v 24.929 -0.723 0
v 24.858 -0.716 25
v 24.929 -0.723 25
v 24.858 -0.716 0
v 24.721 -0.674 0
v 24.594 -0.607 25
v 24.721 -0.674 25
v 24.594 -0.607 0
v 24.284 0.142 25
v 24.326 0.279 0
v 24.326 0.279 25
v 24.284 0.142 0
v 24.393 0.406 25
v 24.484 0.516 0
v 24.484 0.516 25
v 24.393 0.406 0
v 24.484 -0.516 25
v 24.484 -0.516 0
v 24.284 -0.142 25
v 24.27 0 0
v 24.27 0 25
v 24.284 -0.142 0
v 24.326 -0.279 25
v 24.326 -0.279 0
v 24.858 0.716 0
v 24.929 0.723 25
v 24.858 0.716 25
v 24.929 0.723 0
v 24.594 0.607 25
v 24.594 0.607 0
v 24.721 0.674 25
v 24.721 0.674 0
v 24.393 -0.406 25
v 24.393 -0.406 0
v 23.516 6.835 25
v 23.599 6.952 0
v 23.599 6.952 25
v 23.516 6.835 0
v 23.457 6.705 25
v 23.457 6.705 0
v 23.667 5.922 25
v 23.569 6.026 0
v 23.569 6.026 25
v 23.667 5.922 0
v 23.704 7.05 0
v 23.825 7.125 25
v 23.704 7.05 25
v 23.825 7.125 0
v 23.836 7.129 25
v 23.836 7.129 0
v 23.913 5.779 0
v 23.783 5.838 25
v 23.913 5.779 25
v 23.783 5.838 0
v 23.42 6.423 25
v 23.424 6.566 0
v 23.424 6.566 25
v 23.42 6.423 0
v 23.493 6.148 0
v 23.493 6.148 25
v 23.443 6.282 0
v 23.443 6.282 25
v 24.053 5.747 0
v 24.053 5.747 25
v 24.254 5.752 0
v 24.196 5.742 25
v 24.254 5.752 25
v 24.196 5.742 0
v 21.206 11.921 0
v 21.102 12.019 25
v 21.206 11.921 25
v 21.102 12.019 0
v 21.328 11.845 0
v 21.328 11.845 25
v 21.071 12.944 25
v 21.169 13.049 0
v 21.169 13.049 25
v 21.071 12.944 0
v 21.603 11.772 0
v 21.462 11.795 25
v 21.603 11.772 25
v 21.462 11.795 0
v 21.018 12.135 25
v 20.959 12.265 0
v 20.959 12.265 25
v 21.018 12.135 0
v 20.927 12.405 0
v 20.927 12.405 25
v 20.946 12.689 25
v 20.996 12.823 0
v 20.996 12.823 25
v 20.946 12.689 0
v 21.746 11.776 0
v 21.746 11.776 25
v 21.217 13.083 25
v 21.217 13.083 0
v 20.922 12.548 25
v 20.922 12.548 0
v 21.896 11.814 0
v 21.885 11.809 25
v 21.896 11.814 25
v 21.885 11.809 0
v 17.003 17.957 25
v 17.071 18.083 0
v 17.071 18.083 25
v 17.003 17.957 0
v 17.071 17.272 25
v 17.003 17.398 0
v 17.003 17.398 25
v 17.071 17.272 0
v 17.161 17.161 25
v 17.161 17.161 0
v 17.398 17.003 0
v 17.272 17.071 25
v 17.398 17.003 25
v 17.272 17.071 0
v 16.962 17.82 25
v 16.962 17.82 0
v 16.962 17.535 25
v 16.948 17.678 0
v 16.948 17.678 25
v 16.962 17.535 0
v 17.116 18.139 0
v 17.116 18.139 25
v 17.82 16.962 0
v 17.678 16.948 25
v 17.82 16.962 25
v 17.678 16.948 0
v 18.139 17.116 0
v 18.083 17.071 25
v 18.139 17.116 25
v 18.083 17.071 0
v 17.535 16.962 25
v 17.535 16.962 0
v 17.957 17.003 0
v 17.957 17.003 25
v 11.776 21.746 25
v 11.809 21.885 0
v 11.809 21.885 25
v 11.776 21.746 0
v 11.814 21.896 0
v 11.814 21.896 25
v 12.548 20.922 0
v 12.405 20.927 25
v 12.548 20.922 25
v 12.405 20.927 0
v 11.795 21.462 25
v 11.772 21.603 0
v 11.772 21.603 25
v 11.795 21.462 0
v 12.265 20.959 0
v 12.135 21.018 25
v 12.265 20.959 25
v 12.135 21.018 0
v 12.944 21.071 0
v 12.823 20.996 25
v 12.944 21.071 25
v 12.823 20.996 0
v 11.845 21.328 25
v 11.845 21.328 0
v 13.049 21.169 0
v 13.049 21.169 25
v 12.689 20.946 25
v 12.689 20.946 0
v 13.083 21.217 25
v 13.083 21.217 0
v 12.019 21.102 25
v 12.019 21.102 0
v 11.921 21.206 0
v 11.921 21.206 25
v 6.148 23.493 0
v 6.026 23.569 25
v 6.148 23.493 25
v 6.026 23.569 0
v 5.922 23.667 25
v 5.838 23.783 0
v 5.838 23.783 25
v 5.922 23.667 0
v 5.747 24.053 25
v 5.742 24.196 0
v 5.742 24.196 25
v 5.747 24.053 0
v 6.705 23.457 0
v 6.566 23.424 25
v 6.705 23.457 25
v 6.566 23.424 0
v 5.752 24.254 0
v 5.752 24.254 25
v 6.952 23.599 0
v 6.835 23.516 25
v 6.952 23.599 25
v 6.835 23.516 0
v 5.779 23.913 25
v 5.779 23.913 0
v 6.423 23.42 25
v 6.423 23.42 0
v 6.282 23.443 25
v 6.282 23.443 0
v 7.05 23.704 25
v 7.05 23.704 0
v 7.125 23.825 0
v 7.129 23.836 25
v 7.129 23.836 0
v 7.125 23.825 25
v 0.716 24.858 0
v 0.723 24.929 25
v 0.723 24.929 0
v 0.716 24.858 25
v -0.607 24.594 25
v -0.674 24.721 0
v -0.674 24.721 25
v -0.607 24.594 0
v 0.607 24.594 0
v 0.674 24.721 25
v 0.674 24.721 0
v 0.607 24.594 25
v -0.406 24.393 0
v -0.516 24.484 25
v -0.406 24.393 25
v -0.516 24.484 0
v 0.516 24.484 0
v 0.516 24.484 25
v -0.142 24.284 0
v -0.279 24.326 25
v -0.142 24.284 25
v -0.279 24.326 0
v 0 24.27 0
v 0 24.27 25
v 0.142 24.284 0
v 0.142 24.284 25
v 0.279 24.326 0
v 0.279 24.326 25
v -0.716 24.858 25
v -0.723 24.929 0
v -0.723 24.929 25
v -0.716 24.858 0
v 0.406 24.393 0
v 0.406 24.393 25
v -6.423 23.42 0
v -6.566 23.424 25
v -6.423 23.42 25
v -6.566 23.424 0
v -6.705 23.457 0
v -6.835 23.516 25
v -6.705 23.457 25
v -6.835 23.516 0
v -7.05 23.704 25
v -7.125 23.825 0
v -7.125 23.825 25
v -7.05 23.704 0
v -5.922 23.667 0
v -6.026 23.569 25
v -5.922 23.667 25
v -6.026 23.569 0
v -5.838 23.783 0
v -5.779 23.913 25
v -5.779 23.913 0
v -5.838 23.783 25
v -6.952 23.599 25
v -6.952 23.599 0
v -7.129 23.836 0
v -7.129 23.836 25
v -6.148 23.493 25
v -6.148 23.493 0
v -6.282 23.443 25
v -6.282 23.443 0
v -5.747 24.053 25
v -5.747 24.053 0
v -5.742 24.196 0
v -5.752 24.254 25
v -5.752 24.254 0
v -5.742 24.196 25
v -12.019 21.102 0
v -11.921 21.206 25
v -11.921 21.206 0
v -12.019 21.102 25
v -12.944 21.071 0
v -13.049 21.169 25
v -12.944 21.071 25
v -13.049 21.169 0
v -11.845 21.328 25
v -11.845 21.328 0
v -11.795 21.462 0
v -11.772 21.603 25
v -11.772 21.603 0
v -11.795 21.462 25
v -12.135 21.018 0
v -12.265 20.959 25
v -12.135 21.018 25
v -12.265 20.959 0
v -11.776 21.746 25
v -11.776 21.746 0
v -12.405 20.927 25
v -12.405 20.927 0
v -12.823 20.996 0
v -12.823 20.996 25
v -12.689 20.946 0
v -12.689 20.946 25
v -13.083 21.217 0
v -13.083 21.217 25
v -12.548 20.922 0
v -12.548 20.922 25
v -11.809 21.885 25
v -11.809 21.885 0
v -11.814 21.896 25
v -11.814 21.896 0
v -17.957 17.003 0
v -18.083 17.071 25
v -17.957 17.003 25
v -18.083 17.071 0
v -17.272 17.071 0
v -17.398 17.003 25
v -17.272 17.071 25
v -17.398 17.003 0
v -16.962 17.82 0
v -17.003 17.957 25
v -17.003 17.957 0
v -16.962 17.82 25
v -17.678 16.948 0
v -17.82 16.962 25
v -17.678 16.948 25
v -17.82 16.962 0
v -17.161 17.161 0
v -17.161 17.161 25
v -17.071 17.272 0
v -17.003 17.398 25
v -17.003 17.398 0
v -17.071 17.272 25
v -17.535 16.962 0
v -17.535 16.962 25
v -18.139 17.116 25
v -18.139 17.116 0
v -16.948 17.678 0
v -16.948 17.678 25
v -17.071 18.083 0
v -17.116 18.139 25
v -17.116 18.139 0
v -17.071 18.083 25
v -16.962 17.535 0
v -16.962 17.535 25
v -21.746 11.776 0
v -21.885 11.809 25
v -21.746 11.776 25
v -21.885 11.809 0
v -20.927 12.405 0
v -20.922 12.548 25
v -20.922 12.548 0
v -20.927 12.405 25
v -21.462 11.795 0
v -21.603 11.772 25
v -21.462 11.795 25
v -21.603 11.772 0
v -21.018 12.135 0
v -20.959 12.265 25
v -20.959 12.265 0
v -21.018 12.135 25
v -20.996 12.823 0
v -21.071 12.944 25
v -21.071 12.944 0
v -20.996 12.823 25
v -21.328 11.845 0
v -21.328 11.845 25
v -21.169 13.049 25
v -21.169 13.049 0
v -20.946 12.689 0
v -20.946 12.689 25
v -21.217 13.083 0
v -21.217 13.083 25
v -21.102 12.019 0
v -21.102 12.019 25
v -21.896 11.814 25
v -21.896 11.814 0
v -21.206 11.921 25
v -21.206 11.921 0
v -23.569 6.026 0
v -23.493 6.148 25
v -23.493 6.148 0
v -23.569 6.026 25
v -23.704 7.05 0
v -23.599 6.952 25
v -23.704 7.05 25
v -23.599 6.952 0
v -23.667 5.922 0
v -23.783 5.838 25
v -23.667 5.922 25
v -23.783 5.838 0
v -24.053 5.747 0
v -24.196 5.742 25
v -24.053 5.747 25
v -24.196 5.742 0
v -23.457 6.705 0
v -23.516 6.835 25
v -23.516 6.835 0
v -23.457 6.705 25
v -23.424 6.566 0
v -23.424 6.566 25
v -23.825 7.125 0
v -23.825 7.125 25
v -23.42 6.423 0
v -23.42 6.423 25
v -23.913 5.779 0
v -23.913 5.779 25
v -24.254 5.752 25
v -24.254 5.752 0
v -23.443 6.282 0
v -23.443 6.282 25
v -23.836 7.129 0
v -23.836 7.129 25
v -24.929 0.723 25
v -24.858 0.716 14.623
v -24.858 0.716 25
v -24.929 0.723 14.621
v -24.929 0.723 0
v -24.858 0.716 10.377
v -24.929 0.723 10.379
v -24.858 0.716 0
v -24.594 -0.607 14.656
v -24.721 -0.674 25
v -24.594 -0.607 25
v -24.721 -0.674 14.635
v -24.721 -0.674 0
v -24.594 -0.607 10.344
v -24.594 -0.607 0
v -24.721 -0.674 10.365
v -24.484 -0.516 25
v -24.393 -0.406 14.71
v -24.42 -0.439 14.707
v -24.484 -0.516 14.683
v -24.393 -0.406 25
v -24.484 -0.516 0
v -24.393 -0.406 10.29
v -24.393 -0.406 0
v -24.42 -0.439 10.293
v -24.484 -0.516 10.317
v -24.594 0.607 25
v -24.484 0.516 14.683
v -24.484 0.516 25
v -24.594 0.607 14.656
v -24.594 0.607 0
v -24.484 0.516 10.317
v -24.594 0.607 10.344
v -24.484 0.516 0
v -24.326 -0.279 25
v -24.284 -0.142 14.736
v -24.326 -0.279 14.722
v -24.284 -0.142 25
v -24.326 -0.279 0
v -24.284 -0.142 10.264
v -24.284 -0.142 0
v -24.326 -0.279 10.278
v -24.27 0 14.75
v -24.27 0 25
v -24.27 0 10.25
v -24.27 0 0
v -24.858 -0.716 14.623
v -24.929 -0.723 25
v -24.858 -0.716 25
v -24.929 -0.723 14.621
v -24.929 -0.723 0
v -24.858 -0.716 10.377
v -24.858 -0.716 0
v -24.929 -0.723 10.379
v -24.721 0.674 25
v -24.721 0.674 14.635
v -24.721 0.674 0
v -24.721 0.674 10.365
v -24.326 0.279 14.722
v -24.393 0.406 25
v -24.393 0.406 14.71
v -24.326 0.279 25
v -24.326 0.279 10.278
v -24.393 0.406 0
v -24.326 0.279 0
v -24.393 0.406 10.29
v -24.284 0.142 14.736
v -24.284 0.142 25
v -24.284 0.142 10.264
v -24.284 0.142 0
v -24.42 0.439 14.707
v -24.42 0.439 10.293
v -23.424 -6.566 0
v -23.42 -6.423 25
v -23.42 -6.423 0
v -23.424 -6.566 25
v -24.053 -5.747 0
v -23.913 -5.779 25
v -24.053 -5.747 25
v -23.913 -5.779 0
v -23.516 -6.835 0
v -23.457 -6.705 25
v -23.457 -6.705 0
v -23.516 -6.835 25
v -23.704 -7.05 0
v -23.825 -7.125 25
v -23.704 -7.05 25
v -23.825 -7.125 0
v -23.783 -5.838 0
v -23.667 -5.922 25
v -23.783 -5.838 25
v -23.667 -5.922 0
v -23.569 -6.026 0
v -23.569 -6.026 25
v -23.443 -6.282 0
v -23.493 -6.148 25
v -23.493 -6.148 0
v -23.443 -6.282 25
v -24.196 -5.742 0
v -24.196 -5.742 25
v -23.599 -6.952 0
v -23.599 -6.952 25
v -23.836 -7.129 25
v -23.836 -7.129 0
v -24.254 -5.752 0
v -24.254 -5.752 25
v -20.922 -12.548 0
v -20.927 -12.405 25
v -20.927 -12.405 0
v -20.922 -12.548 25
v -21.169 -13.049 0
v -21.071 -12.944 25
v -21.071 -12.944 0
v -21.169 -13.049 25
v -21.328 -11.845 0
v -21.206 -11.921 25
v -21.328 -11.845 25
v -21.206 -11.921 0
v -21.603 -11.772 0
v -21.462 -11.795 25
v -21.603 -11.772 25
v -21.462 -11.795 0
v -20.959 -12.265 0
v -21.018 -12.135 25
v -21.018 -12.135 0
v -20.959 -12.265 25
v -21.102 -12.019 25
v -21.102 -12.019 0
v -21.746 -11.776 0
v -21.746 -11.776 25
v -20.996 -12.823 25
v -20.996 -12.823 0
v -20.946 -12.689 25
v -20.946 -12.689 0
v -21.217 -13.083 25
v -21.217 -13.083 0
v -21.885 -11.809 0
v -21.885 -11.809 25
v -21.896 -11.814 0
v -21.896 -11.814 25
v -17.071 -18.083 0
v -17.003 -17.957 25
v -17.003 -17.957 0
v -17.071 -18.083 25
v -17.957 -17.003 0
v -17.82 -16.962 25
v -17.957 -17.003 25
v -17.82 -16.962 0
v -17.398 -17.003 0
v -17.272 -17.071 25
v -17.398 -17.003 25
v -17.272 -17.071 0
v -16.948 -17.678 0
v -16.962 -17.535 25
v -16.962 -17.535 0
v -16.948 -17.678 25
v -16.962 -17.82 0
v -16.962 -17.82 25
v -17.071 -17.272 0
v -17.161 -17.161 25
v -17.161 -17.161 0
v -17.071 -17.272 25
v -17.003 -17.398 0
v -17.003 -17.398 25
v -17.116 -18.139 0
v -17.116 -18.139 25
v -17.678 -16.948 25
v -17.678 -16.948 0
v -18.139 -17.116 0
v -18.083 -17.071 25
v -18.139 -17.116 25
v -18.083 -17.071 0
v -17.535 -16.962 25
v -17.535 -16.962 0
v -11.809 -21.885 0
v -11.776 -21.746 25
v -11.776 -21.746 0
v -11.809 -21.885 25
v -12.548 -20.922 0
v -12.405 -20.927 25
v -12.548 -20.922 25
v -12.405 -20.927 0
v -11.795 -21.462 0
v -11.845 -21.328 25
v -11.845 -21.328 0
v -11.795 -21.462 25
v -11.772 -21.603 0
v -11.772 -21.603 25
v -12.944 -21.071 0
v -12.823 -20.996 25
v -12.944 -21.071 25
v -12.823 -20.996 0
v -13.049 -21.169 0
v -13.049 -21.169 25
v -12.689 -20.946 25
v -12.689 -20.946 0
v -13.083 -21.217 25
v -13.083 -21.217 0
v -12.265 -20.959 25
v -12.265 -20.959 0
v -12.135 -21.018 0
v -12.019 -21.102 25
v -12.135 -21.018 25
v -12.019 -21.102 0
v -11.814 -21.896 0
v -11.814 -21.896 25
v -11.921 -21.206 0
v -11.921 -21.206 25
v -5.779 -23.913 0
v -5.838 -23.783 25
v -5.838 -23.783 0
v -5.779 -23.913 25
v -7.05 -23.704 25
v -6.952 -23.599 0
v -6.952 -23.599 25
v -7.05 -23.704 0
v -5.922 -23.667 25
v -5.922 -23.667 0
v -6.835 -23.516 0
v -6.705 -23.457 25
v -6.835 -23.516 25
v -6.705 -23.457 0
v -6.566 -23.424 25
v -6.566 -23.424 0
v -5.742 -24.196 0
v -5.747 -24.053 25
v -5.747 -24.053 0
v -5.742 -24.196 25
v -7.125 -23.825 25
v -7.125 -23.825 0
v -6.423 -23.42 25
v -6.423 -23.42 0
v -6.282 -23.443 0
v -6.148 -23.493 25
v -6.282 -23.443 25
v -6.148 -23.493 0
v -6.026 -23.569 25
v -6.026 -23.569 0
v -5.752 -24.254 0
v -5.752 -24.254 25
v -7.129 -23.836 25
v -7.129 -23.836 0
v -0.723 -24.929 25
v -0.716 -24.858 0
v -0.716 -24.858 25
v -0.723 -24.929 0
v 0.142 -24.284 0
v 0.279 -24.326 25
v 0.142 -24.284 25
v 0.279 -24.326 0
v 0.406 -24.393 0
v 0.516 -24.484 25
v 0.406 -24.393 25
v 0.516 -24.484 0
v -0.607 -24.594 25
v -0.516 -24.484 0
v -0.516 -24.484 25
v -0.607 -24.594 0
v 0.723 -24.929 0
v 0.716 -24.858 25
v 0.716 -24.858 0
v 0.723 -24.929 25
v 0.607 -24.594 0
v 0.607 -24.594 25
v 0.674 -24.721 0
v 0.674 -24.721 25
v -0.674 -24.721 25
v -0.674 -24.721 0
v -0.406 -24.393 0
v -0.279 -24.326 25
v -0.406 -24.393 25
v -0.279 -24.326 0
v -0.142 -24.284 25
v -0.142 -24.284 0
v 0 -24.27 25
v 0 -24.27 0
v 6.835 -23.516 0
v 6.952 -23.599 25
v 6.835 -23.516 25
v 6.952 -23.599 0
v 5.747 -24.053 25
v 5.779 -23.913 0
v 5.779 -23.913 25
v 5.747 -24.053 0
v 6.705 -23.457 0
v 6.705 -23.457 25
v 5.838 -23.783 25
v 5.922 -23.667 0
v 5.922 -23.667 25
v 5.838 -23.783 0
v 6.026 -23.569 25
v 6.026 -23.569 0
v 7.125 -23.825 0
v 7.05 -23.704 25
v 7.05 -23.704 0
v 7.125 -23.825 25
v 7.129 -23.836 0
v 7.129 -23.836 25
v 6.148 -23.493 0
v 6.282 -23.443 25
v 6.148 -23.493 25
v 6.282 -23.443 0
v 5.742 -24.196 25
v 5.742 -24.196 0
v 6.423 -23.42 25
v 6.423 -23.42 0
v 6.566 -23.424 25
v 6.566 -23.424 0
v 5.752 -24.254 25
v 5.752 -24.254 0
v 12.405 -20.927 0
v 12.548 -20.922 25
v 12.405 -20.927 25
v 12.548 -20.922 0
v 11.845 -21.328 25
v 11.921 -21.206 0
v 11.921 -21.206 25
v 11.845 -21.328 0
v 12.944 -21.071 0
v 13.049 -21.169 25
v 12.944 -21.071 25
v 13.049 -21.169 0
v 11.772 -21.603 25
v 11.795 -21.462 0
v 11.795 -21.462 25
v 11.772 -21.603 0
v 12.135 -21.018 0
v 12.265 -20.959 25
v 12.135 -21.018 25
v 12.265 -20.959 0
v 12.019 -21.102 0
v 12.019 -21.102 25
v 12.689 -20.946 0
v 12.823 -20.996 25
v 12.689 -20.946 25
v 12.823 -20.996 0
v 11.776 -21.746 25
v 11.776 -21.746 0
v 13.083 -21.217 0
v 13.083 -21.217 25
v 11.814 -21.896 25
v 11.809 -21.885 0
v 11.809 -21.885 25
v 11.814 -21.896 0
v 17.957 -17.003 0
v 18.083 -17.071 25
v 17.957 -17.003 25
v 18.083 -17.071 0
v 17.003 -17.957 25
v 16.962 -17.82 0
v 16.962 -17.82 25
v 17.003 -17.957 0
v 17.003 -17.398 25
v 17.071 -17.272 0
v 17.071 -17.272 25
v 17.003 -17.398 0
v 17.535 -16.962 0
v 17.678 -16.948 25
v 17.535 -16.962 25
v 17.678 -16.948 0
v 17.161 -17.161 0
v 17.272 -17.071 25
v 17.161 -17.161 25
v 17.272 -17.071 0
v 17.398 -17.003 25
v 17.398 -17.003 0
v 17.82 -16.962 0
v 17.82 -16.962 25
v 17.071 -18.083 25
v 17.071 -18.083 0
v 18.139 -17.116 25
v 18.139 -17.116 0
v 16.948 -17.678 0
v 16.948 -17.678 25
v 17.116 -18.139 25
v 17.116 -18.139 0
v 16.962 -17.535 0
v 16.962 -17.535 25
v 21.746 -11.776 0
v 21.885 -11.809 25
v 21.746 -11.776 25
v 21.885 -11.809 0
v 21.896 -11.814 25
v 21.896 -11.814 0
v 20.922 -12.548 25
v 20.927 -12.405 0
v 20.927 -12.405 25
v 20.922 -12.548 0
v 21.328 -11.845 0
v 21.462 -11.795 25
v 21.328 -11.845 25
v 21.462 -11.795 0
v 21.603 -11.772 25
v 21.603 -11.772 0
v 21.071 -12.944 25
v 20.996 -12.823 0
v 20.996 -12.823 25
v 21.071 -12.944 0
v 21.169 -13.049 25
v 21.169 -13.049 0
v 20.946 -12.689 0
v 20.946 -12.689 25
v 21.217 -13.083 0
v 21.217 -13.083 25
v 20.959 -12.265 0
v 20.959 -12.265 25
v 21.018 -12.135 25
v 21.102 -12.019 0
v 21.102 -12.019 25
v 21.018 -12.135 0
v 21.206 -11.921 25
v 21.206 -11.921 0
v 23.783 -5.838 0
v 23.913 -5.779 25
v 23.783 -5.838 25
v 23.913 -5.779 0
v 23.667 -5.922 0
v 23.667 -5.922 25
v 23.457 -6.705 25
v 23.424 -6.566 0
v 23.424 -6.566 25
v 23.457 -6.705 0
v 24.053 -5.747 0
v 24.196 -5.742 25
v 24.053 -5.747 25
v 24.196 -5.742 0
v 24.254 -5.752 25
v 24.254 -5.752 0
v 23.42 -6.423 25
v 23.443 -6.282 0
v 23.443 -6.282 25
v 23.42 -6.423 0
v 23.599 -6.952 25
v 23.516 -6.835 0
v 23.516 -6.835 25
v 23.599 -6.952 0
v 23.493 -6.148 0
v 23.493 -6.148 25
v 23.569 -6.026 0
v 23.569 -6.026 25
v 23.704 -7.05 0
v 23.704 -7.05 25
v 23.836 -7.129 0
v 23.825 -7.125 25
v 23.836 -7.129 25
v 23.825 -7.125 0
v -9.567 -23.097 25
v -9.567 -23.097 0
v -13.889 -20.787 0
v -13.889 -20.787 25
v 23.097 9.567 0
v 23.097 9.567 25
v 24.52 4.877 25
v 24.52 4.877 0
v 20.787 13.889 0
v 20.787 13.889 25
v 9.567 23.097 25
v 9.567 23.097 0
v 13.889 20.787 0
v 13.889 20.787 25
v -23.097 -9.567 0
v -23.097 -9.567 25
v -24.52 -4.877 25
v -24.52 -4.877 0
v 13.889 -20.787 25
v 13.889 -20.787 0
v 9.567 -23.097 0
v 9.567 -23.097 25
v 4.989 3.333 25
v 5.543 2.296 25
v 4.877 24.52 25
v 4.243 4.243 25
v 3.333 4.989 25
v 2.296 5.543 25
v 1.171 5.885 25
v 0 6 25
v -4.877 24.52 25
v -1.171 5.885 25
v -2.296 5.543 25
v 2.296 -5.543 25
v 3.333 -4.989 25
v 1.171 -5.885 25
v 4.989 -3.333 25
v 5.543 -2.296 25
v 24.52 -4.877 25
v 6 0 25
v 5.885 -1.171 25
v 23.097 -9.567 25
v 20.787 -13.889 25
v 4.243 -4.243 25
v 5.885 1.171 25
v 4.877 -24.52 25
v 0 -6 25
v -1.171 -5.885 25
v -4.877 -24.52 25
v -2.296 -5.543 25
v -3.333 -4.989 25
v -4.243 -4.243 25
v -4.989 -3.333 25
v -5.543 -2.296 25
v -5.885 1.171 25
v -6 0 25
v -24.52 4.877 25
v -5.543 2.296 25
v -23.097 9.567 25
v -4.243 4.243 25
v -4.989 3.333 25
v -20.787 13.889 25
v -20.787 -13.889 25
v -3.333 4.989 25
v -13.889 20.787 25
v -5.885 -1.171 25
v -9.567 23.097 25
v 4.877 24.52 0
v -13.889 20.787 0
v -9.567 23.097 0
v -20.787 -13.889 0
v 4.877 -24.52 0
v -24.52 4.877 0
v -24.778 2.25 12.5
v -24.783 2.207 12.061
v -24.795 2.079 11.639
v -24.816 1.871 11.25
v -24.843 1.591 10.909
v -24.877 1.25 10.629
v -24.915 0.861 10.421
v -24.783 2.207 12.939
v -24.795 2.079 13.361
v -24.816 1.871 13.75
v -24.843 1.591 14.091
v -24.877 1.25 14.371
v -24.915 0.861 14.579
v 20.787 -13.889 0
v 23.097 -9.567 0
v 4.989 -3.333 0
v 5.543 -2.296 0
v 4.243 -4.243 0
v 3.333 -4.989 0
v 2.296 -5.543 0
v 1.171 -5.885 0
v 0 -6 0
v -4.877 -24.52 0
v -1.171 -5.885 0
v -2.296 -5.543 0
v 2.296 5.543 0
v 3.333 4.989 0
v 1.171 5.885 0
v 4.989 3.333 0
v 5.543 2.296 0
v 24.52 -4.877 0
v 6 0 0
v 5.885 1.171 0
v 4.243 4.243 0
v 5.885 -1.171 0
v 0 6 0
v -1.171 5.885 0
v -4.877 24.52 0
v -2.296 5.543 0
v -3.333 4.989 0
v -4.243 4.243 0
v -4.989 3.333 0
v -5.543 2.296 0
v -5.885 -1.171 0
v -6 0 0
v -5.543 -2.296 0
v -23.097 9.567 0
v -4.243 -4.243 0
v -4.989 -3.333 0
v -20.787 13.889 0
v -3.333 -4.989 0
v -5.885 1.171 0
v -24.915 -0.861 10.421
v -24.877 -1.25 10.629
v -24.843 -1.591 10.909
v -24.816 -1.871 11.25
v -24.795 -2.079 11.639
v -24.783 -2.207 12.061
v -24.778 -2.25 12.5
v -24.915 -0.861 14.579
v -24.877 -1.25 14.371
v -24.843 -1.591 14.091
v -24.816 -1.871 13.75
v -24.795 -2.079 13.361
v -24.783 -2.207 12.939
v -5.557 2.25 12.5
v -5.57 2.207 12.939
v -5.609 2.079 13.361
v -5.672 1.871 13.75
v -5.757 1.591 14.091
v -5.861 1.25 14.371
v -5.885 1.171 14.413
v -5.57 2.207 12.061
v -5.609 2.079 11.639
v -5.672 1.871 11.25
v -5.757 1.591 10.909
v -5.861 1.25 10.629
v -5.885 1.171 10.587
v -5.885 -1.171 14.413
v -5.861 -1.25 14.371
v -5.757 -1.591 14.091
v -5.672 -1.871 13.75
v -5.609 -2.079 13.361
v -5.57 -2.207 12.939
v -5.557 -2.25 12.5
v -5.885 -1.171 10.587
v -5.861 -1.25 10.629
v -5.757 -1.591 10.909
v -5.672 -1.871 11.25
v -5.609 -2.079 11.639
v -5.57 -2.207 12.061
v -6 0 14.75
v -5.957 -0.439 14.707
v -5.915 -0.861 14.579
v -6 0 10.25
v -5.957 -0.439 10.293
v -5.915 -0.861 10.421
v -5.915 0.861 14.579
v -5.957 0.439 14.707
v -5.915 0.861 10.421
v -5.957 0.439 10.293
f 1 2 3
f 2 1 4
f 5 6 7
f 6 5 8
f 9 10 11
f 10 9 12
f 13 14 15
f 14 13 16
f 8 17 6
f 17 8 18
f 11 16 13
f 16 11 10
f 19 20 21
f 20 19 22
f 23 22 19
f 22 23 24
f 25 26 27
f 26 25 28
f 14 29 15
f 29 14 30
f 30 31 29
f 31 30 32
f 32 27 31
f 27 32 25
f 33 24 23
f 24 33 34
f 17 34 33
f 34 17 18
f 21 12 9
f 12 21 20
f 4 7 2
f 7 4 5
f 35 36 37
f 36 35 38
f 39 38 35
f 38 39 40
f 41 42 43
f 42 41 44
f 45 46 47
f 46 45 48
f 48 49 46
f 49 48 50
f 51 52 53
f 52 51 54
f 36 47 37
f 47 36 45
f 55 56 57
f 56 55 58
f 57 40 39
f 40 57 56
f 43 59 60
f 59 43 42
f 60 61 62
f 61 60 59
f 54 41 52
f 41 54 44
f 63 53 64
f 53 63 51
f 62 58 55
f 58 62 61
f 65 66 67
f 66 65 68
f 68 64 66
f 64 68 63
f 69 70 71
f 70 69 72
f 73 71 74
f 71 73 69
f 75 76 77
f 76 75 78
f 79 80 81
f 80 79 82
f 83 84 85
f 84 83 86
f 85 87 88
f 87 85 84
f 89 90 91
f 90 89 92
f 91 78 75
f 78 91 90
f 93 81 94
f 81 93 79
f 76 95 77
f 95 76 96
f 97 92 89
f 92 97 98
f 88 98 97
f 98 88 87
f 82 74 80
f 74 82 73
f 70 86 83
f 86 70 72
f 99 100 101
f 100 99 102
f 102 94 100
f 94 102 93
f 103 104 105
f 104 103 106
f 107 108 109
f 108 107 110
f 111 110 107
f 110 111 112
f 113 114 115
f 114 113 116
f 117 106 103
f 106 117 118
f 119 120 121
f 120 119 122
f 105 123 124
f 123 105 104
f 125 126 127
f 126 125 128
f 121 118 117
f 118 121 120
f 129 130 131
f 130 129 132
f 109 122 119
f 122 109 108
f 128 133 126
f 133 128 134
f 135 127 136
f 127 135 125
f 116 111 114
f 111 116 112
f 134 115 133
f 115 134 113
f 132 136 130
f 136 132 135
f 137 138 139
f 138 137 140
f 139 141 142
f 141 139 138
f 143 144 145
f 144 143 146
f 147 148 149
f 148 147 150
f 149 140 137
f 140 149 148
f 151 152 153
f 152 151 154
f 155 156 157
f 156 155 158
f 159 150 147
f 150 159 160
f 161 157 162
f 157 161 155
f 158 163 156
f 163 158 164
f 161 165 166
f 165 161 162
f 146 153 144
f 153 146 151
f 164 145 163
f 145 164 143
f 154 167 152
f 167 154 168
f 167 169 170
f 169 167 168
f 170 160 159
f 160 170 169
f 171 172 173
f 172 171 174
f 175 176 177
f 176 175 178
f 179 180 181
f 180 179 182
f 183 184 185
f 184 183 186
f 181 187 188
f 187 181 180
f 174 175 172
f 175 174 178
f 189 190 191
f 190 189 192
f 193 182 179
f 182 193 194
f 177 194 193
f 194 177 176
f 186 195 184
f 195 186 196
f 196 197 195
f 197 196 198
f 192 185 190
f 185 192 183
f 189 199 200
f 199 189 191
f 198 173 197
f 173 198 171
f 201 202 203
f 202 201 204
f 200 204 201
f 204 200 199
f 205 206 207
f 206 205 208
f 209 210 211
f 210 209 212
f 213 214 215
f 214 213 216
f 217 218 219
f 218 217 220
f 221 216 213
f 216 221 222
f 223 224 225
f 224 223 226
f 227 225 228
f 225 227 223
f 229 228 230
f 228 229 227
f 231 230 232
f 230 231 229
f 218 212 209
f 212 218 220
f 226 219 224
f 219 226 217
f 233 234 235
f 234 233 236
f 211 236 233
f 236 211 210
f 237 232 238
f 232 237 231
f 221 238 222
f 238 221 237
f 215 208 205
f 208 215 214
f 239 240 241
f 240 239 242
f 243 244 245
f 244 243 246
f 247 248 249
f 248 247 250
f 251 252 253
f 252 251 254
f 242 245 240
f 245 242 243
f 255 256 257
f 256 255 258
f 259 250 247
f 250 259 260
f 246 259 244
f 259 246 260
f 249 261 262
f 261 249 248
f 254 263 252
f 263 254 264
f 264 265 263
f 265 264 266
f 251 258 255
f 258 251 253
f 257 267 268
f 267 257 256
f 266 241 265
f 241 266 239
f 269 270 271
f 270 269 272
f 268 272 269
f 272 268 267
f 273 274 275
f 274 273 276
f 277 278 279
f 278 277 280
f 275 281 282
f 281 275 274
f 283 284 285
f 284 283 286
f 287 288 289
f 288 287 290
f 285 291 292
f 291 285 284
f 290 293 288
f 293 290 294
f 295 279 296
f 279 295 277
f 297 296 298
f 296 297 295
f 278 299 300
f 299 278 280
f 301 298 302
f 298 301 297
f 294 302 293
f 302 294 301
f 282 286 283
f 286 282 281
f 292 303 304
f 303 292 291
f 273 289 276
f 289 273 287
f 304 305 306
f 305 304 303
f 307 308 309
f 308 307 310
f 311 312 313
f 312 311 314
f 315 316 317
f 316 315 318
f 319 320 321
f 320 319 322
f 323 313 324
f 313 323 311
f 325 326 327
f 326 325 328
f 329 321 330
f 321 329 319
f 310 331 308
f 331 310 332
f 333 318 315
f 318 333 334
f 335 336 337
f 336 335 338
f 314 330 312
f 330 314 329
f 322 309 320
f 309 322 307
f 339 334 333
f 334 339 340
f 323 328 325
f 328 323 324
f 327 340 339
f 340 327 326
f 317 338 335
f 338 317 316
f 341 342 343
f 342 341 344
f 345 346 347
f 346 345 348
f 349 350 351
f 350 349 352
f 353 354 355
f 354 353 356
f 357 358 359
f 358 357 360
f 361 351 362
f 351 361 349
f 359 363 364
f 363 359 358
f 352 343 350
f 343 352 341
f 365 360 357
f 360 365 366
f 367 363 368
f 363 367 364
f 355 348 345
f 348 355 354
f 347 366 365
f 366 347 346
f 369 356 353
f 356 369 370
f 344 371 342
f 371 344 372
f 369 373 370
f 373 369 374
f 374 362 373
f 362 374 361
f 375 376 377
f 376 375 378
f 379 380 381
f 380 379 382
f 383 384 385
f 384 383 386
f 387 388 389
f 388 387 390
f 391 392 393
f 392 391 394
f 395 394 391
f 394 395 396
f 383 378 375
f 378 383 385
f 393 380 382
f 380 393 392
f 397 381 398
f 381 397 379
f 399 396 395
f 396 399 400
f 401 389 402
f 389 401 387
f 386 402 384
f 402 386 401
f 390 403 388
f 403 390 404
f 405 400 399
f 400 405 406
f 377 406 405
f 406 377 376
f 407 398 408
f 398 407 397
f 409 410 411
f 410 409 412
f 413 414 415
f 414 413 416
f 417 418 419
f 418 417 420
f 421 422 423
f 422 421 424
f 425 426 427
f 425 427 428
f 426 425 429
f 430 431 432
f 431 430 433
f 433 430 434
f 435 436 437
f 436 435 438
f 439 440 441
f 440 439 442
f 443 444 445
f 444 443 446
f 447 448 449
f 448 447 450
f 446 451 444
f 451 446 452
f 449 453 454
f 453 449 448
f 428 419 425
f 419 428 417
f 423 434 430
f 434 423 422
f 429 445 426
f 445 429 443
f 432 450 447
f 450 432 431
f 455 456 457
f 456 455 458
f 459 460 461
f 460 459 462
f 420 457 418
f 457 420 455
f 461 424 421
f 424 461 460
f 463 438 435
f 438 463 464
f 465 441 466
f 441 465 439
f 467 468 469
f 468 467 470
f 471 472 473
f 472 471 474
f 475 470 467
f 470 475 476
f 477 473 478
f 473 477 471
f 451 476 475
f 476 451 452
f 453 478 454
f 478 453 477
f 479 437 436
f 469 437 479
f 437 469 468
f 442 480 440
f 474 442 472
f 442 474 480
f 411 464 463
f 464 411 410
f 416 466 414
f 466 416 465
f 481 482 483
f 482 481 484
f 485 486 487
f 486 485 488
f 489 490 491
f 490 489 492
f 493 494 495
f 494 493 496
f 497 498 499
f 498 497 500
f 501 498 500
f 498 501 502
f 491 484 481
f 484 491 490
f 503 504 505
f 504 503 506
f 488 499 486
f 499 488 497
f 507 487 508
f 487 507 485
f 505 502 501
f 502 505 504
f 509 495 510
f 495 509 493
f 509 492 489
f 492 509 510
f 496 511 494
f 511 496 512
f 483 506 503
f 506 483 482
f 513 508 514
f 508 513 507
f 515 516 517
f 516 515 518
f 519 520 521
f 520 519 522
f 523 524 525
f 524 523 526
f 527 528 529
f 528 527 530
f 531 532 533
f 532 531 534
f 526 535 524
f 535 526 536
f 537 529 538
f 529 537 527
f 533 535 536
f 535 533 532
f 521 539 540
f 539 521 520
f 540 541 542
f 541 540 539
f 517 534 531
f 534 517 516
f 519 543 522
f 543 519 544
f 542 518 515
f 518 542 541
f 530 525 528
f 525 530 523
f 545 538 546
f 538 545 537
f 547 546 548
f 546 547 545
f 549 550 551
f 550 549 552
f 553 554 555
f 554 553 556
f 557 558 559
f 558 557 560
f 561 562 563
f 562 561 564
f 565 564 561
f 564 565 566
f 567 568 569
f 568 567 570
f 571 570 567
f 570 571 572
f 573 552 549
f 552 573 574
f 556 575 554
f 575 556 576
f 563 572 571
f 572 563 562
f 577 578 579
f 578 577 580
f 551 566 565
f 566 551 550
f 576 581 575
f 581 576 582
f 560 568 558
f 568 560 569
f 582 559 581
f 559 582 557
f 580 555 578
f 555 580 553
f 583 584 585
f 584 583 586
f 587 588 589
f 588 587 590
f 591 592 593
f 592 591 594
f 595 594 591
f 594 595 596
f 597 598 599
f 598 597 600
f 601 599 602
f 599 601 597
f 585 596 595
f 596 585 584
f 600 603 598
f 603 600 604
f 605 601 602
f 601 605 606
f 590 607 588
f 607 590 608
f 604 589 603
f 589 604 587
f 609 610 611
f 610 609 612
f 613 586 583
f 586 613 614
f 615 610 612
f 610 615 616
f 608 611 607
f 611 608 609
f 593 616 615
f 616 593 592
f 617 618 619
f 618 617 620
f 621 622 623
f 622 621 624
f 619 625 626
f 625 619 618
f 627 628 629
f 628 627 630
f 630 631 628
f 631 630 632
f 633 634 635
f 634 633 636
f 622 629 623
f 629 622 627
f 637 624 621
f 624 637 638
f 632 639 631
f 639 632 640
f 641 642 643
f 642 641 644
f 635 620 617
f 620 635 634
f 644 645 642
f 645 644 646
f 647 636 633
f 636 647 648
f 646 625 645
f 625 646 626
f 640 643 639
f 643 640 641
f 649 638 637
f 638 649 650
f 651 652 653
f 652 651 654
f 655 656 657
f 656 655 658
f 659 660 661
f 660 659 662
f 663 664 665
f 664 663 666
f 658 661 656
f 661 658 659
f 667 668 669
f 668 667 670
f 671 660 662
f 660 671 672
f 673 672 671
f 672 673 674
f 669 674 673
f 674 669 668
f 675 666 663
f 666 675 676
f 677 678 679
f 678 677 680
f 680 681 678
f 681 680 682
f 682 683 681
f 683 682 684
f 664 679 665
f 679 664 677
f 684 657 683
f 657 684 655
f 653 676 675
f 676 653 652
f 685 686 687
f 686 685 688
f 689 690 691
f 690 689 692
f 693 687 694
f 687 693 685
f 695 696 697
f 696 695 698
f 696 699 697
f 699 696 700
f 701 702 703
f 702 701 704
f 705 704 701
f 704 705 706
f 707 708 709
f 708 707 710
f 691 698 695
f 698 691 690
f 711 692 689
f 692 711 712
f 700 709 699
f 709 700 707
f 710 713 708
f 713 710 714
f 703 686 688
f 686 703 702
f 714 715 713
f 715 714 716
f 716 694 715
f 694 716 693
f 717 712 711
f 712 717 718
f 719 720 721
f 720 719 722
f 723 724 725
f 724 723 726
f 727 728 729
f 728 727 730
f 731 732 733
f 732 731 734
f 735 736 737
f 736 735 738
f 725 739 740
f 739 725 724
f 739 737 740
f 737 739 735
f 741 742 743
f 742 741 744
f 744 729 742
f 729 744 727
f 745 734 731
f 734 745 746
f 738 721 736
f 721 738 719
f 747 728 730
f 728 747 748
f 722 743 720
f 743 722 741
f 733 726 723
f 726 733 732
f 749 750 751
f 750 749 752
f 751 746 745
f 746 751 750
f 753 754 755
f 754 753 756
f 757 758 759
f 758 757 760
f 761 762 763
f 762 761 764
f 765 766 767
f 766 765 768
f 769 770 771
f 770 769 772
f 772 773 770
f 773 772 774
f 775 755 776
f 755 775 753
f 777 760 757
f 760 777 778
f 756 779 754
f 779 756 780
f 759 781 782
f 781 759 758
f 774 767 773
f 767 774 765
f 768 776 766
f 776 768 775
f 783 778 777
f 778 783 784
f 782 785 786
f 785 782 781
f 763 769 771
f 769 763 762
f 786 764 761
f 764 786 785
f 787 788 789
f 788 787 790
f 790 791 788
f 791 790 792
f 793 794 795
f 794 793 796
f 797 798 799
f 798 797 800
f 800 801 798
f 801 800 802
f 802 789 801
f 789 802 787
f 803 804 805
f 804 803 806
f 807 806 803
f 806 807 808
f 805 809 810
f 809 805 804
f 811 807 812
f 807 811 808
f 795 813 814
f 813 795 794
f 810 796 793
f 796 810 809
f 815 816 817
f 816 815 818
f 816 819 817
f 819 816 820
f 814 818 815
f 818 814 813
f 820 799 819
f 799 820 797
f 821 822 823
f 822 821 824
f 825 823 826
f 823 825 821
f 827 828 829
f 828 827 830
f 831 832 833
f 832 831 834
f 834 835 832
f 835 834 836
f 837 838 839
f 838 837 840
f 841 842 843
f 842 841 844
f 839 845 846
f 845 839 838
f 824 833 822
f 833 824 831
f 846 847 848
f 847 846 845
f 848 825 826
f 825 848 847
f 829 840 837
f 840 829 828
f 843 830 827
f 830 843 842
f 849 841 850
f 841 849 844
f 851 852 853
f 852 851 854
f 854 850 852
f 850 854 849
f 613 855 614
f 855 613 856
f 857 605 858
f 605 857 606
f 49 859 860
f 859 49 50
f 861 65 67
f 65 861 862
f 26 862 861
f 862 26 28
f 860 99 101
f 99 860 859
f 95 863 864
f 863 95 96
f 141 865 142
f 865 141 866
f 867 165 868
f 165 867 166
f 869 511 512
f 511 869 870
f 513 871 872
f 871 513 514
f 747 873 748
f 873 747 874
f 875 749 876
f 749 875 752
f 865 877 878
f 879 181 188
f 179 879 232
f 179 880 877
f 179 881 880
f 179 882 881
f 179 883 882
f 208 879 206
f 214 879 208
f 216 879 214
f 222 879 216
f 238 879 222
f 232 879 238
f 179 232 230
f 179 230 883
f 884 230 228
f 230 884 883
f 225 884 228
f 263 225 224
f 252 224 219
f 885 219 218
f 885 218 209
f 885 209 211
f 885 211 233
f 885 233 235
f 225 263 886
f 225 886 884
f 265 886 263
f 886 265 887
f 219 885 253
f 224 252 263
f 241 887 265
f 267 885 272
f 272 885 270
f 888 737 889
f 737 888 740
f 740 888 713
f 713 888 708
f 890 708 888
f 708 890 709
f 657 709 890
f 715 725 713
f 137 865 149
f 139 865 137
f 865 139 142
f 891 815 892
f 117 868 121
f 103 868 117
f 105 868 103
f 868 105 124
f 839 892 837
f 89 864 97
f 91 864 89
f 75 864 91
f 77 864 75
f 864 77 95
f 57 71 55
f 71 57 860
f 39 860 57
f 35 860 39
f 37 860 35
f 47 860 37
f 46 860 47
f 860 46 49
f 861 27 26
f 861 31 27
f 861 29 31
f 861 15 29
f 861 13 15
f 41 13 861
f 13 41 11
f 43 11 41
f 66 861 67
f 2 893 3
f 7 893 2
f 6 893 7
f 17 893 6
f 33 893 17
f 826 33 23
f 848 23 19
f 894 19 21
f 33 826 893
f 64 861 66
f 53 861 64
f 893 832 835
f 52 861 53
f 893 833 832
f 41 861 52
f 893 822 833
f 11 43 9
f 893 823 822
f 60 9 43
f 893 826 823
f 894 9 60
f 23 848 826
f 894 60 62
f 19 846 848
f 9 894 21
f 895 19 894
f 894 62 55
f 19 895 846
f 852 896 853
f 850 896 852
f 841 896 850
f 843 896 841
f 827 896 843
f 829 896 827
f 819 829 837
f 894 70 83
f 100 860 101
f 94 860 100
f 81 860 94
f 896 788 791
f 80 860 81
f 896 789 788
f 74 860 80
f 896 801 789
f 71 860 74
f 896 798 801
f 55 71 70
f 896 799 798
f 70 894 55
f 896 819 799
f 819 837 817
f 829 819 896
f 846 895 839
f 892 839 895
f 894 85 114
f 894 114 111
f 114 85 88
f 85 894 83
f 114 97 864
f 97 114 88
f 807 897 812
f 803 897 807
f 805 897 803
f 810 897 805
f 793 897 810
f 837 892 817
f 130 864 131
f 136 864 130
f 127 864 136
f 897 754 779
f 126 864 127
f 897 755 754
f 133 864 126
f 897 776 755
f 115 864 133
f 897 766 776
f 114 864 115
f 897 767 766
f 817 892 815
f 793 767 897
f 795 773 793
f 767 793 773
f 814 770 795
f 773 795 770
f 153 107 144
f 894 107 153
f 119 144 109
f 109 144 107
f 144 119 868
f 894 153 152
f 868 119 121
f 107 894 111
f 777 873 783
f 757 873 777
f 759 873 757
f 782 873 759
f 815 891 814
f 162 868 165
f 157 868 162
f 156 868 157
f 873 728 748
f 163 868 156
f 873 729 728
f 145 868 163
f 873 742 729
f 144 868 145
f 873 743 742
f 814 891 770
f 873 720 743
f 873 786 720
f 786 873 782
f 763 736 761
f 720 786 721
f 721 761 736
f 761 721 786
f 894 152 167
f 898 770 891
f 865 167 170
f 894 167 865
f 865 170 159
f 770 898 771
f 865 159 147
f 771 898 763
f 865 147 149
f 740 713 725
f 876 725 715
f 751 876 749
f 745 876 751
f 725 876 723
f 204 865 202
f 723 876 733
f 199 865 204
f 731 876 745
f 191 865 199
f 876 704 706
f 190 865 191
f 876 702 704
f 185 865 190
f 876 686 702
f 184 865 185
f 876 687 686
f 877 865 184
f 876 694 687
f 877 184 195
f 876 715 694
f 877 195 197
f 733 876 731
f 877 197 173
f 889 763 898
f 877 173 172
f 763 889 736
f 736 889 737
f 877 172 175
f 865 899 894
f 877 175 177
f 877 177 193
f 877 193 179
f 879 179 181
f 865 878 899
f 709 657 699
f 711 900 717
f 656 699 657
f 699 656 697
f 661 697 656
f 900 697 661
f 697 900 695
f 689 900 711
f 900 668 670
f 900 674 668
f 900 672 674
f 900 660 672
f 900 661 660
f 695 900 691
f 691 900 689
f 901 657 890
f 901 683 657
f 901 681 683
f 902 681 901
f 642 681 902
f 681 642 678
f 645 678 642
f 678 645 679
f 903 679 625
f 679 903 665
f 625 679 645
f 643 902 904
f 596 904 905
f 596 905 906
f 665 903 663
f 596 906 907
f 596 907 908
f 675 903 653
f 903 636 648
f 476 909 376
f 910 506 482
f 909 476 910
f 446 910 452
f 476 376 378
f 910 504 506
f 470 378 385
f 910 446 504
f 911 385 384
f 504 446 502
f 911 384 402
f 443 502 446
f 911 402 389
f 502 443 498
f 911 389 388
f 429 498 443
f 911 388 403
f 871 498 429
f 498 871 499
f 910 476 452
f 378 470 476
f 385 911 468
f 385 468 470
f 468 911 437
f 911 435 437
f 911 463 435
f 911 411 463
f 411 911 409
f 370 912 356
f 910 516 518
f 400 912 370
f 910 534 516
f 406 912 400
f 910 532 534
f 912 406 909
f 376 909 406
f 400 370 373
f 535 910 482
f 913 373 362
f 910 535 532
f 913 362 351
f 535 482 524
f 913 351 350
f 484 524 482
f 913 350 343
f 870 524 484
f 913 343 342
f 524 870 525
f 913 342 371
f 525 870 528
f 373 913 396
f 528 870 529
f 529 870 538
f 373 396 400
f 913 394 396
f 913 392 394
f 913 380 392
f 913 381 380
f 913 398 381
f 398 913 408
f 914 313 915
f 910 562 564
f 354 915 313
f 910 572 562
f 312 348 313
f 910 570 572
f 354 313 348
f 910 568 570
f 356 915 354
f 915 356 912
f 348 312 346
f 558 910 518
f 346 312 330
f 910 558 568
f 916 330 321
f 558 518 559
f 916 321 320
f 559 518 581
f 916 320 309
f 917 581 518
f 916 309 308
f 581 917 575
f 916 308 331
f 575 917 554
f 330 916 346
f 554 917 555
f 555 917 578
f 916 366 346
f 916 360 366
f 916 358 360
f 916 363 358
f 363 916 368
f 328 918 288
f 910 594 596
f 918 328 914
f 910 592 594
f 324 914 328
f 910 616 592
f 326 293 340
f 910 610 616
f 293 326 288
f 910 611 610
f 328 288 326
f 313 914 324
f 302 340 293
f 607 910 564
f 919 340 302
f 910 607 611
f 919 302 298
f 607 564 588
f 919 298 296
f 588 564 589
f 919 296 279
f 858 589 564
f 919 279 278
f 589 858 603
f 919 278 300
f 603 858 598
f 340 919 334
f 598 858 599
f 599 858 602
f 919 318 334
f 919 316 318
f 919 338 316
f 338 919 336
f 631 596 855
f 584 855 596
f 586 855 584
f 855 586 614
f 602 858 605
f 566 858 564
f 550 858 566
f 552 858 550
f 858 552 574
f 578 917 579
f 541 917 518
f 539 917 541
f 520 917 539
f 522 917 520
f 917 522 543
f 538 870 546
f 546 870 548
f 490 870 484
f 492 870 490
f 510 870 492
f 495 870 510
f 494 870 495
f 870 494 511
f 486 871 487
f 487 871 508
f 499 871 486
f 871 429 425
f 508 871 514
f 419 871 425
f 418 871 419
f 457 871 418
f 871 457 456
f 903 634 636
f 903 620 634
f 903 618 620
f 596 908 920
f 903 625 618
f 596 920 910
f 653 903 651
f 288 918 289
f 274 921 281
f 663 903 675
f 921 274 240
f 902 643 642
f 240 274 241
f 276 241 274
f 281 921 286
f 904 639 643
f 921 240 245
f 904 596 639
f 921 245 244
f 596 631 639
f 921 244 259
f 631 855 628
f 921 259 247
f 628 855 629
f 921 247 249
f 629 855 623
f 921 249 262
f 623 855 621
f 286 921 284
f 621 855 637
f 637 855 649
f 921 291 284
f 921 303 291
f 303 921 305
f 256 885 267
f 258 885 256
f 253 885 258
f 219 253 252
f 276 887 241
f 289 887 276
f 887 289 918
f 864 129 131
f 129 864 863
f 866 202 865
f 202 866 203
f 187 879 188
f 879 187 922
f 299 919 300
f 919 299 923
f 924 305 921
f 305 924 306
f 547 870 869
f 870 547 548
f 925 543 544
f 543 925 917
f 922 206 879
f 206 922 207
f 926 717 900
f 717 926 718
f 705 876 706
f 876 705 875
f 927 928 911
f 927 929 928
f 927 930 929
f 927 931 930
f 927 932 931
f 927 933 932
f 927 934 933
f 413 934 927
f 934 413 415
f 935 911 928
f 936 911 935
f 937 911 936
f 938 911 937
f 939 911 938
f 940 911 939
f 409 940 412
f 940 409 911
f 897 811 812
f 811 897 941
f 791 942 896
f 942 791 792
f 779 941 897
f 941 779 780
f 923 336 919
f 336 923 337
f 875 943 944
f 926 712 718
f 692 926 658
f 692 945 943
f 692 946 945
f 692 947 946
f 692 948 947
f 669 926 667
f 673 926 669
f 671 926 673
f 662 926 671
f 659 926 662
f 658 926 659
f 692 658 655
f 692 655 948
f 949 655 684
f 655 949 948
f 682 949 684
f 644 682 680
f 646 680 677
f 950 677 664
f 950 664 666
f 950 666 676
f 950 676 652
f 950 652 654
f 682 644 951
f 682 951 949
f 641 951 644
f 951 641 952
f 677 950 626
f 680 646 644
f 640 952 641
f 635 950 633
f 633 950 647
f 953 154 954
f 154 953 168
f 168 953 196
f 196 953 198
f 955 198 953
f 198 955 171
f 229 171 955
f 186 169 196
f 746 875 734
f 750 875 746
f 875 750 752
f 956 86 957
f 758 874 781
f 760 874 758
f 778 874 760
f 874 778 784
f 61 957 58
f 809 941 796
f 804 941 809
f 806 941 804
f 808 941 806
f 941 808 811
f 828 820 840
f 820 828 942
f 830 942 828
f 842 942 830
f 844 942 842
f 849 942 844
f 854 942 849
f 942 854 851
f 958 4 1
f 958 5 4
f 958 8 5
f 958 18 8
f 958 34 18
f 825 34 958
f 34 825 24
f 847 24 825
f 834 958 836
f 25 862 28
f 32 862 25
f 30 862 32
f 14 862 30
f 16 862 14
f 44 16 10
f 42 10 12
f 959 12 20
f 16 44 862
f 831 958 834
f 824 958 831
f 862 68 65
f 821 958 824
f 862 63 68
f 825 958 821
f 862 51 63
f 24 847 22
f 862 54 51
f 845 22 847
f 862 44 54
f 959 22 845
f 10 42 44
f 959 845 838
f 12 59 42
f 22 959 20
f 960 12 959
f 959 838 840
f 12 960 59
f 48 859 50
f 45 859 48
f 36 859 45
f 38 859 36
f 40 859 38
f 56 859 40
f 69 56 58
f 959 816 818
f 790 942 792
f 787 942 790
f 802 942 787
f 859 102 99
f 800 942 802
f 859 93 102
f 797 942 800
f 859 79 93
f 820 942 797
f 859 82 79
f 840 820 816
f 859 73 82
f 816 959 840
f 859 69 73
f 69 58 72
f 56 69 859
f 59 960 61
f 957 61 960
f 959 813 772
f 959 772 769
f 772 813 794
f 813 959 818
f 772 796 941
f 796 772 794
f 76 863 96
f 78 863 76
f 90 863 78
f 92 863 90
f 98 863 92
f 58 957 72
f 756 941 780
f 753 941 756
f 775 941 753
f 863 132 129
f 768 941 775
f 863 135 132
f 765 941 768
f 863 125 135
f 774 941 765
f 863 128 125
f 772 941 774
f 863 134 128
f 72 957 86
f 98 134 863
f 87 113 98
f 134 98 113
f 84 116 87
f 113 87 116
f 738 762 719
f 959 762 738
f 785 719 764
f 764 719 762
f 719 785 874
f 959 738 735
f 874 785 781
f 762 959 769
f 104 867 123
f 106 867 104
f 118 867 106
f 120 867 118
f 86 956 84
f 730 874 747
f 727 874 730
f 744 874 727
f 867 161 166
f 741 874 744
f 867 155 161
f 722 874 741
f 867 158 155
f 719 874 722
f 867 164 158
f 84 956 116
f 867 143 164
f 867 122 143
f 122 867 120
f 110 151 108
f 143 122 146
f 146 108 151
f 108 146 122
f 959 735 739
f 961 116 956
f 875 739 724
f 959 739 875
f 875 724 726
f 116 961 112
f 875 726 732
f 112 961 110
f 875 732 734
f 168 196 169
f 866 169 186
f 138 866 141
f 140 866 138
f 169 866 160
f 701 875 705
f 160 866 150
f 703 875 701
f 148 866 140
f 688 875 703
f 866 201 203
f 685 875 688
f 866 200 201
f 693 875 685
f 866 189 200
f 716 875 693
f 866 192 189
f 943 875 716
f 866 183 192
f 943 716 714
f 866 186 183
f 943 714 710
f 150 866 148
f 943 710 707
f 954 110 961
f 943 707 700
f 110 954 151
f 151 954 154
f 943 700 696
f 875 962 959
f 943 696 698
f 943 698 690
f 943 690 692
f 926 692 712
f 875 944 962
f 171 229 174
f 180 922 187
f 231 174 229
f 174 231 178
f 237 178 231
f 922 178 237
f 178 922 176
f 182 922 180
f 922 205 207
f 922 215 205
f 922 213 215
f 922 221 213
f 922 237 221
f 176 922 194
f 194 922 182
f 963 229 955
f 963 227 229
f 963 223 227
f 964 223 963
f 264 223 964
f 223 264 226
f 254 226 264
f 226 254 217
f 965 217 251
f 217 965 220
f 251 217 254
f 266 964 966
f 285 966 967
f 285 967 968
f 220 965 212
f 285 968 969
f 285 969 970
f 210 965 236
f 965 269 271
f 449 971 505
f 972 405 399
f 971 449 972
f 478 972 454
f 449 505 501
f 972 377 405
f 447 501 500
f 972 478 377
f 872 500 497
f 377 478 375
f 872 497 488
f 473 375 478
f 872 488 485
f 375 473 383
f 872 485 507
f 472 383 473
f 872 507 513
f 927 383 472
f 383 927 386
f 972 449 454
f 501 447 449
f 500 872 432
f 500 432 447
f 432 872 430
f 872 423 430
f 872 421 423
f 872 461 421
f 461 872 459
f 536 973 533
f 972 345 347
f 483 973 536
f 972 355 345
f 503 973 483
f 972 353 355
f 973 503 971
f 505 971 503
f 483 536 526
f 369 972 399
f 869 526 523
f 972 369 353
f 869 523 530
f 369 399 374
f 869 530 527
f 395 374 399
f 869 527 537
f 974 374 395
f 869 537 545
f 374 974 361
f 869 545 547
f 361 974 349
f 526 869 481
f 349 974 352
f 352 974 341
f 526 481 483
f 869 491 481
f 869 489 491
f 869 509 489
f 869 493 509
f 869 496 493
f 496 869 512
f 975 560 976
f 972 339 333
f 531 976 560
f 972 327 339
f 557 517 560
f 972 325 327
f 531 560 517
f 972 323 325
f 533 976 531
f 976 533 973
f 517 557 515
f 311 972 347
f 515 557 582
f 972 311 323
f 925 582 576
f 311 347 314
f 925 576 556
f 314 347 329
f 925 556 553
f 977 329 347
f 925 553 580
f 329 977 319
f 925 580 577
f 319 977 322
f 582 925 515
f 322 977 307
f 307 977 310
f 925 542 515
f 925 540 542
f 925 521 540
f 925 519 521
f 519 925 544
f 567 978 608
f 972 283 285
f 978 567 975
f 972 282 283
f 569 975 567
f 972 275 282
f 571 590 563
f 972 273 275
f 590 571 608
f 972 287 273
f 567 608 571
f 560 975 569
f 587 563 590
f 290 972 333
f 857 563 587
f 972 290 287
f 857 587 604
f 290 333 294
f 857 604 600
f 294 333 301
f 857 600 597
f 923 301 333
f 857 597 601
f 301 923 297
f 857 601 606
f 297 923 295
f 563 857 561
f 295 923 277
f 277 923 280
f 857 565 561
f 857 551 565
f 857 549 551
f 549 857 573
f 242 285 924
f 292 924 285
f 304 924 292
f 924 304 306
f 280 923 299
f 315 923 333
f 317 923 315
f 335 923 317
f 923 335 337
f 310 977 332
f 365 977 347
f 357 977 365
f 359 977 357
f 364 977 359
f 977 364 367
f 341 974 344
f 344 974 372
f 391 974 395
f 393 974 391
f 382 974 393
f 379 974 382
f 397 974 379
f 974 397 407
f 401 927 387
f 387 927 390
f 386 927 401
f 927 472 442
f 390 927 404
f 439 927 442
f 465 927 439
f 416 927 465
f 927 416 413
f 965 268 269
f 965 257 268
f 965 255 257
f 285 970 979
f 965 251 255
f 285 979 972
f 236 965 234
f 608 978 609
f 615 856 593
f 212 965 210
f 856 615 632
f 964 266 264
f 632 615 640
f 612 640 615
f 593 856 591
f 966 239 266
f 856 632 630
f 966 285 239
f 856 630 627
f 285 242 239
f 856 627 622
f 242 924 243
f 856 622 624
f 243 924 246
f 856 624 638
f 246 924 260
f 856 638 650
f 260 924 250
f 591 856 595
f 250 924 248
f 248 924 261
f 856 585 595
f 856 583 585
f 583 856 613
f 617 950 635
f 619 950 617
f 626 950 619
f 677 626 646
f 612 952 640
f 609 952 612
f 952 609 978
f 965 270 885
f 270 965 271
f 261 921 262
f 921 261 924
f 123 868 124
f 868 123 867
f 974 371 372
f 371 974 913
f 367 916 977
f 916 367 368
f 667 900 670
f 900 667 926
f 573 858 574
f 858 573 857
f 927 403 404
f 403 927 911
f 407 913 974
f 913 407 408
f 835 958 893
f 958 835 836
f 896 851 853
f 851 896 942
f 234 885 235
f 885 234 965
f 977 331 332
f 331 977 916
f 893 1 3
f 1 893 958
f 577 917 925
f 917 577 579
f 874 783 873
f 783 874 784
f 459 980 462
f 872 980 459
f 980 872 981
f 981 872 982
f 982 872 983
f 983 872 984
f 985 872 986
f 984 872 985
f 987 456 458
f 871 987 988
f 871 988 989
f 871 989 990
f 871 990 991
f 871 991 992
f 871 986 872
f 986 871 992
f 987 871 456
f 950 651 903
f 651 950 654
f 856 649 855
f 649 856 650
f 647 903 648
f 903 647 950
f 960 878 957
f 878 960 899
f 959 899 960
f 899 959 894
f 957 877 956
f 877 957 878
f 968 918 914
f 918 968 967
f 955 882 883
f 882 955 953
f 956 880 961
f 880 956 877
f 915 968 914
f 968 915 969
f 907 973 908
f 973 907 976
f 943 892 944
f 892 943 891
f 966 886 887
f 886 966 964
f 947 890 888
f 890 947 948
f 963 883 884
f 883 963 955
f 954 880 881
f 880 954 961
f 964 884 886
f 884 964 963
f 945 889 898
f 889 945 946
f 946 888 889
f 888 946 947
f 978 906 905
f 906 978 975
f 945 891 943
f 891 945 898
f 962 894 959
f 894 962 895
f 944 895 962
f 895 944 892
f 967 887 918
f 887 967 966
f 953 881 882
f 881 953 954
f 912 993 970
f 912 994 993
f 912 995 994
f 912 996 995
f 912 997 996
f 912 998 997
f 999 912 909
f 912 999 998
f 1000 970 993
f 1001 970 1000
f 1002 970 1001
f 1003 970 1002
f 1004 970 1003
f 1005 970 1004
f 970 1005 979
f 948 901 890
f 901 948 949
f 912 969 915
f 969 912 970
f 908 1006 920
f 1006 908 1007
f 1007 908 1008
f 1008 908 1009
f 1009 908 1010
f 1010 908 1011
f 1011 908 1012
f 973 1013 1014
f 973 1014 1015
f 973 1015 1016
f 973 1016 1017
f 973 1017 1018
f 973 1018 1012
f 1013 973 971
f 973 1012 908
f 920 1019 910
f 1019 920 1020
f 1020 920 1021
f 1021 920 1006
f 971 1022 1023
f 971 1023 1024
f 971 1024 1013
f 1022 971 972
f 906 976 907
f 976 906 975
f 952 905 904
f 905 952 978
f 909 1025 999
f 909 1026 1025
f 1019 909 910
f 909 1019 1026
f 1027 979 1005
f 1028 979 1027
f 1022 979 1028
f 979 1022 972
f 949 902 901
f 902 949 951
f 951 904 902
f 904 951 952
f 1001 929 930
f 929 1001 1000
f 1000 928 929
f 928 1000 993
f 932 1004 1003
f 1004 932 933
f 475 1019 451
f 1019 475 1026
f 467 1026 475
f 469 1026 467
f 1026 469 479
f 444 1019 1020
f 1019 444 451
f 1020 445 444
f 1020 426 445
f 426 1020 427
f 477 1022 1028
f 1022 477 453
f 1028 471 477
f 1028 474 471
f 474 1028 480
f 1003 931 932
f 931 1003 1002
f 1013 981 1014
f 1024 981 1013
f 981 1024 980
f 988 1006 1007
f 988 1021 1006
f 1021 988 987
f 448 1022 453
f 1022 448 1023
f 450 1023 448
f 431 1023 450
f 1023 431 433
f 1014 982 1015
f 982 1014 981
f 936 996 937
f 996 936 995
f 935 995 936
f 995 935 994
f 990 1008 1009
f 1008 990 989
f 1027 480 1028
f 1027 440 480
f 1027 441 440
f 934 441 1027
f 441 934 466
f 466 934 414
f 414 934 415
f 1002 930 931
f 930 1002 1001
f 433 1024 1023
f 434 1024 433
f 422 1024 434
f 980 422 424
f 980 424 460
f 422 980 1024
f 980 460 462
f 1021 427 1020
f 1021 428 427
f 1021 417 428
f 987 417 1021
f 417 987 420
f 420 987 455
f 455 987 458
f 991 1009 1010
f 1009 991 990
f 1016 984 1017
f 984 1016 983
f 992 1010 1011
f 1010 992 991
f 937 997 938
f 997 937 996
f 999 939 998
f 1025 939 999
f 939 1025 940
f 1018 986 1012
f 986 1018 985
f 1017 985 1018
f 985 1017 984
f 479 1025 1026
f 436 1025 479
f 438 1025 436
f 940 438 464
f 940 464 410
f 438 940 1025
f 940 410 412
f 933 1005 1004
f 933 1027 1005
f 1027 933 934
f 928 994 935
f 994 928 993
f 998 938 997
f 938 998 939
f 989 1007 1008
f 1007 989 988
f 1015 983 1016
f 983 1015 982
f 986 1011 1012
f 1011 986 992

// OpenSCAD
$fn = 32;

// ----------------------------------------------------------------------
// Hand knob: 50 x 50 x 25 mm
// ----------------------------------------------------------------------

// --- parameters (mm) ---
head_d = 50;              // knob diameter
head_h = 25;              // knob height
hole_d = 12;              // shaft bore
set_d = 4.5;              // set screw tap hole
notch_d = 1.46;           // knurl groove diameter
knurl_n = 24;             // number of knurl grooves

module body() {
  cylinder(h = head_h, d = head_d);
}

difference() {
  union() {
    body();
  }
  translate([0, 0, -1]) cylinder(h = head_h + 0 + 2, d = hole_d);
  /* knurl grooves */
  for (i = [0 : knurl_n - 1])
    rotate([0, 0, i * 360 / knurl_n])
      translate([head_d / 2, 0, -0.5])
        cylinder(h = head_h + 1, d = notch_d);
  translate([-head_d / 2 - 1, 0, head_h * 0.5]) rotate([0, 90, 0]) cylinder(h = head_d / 2 + 2, d = set_d);
}
